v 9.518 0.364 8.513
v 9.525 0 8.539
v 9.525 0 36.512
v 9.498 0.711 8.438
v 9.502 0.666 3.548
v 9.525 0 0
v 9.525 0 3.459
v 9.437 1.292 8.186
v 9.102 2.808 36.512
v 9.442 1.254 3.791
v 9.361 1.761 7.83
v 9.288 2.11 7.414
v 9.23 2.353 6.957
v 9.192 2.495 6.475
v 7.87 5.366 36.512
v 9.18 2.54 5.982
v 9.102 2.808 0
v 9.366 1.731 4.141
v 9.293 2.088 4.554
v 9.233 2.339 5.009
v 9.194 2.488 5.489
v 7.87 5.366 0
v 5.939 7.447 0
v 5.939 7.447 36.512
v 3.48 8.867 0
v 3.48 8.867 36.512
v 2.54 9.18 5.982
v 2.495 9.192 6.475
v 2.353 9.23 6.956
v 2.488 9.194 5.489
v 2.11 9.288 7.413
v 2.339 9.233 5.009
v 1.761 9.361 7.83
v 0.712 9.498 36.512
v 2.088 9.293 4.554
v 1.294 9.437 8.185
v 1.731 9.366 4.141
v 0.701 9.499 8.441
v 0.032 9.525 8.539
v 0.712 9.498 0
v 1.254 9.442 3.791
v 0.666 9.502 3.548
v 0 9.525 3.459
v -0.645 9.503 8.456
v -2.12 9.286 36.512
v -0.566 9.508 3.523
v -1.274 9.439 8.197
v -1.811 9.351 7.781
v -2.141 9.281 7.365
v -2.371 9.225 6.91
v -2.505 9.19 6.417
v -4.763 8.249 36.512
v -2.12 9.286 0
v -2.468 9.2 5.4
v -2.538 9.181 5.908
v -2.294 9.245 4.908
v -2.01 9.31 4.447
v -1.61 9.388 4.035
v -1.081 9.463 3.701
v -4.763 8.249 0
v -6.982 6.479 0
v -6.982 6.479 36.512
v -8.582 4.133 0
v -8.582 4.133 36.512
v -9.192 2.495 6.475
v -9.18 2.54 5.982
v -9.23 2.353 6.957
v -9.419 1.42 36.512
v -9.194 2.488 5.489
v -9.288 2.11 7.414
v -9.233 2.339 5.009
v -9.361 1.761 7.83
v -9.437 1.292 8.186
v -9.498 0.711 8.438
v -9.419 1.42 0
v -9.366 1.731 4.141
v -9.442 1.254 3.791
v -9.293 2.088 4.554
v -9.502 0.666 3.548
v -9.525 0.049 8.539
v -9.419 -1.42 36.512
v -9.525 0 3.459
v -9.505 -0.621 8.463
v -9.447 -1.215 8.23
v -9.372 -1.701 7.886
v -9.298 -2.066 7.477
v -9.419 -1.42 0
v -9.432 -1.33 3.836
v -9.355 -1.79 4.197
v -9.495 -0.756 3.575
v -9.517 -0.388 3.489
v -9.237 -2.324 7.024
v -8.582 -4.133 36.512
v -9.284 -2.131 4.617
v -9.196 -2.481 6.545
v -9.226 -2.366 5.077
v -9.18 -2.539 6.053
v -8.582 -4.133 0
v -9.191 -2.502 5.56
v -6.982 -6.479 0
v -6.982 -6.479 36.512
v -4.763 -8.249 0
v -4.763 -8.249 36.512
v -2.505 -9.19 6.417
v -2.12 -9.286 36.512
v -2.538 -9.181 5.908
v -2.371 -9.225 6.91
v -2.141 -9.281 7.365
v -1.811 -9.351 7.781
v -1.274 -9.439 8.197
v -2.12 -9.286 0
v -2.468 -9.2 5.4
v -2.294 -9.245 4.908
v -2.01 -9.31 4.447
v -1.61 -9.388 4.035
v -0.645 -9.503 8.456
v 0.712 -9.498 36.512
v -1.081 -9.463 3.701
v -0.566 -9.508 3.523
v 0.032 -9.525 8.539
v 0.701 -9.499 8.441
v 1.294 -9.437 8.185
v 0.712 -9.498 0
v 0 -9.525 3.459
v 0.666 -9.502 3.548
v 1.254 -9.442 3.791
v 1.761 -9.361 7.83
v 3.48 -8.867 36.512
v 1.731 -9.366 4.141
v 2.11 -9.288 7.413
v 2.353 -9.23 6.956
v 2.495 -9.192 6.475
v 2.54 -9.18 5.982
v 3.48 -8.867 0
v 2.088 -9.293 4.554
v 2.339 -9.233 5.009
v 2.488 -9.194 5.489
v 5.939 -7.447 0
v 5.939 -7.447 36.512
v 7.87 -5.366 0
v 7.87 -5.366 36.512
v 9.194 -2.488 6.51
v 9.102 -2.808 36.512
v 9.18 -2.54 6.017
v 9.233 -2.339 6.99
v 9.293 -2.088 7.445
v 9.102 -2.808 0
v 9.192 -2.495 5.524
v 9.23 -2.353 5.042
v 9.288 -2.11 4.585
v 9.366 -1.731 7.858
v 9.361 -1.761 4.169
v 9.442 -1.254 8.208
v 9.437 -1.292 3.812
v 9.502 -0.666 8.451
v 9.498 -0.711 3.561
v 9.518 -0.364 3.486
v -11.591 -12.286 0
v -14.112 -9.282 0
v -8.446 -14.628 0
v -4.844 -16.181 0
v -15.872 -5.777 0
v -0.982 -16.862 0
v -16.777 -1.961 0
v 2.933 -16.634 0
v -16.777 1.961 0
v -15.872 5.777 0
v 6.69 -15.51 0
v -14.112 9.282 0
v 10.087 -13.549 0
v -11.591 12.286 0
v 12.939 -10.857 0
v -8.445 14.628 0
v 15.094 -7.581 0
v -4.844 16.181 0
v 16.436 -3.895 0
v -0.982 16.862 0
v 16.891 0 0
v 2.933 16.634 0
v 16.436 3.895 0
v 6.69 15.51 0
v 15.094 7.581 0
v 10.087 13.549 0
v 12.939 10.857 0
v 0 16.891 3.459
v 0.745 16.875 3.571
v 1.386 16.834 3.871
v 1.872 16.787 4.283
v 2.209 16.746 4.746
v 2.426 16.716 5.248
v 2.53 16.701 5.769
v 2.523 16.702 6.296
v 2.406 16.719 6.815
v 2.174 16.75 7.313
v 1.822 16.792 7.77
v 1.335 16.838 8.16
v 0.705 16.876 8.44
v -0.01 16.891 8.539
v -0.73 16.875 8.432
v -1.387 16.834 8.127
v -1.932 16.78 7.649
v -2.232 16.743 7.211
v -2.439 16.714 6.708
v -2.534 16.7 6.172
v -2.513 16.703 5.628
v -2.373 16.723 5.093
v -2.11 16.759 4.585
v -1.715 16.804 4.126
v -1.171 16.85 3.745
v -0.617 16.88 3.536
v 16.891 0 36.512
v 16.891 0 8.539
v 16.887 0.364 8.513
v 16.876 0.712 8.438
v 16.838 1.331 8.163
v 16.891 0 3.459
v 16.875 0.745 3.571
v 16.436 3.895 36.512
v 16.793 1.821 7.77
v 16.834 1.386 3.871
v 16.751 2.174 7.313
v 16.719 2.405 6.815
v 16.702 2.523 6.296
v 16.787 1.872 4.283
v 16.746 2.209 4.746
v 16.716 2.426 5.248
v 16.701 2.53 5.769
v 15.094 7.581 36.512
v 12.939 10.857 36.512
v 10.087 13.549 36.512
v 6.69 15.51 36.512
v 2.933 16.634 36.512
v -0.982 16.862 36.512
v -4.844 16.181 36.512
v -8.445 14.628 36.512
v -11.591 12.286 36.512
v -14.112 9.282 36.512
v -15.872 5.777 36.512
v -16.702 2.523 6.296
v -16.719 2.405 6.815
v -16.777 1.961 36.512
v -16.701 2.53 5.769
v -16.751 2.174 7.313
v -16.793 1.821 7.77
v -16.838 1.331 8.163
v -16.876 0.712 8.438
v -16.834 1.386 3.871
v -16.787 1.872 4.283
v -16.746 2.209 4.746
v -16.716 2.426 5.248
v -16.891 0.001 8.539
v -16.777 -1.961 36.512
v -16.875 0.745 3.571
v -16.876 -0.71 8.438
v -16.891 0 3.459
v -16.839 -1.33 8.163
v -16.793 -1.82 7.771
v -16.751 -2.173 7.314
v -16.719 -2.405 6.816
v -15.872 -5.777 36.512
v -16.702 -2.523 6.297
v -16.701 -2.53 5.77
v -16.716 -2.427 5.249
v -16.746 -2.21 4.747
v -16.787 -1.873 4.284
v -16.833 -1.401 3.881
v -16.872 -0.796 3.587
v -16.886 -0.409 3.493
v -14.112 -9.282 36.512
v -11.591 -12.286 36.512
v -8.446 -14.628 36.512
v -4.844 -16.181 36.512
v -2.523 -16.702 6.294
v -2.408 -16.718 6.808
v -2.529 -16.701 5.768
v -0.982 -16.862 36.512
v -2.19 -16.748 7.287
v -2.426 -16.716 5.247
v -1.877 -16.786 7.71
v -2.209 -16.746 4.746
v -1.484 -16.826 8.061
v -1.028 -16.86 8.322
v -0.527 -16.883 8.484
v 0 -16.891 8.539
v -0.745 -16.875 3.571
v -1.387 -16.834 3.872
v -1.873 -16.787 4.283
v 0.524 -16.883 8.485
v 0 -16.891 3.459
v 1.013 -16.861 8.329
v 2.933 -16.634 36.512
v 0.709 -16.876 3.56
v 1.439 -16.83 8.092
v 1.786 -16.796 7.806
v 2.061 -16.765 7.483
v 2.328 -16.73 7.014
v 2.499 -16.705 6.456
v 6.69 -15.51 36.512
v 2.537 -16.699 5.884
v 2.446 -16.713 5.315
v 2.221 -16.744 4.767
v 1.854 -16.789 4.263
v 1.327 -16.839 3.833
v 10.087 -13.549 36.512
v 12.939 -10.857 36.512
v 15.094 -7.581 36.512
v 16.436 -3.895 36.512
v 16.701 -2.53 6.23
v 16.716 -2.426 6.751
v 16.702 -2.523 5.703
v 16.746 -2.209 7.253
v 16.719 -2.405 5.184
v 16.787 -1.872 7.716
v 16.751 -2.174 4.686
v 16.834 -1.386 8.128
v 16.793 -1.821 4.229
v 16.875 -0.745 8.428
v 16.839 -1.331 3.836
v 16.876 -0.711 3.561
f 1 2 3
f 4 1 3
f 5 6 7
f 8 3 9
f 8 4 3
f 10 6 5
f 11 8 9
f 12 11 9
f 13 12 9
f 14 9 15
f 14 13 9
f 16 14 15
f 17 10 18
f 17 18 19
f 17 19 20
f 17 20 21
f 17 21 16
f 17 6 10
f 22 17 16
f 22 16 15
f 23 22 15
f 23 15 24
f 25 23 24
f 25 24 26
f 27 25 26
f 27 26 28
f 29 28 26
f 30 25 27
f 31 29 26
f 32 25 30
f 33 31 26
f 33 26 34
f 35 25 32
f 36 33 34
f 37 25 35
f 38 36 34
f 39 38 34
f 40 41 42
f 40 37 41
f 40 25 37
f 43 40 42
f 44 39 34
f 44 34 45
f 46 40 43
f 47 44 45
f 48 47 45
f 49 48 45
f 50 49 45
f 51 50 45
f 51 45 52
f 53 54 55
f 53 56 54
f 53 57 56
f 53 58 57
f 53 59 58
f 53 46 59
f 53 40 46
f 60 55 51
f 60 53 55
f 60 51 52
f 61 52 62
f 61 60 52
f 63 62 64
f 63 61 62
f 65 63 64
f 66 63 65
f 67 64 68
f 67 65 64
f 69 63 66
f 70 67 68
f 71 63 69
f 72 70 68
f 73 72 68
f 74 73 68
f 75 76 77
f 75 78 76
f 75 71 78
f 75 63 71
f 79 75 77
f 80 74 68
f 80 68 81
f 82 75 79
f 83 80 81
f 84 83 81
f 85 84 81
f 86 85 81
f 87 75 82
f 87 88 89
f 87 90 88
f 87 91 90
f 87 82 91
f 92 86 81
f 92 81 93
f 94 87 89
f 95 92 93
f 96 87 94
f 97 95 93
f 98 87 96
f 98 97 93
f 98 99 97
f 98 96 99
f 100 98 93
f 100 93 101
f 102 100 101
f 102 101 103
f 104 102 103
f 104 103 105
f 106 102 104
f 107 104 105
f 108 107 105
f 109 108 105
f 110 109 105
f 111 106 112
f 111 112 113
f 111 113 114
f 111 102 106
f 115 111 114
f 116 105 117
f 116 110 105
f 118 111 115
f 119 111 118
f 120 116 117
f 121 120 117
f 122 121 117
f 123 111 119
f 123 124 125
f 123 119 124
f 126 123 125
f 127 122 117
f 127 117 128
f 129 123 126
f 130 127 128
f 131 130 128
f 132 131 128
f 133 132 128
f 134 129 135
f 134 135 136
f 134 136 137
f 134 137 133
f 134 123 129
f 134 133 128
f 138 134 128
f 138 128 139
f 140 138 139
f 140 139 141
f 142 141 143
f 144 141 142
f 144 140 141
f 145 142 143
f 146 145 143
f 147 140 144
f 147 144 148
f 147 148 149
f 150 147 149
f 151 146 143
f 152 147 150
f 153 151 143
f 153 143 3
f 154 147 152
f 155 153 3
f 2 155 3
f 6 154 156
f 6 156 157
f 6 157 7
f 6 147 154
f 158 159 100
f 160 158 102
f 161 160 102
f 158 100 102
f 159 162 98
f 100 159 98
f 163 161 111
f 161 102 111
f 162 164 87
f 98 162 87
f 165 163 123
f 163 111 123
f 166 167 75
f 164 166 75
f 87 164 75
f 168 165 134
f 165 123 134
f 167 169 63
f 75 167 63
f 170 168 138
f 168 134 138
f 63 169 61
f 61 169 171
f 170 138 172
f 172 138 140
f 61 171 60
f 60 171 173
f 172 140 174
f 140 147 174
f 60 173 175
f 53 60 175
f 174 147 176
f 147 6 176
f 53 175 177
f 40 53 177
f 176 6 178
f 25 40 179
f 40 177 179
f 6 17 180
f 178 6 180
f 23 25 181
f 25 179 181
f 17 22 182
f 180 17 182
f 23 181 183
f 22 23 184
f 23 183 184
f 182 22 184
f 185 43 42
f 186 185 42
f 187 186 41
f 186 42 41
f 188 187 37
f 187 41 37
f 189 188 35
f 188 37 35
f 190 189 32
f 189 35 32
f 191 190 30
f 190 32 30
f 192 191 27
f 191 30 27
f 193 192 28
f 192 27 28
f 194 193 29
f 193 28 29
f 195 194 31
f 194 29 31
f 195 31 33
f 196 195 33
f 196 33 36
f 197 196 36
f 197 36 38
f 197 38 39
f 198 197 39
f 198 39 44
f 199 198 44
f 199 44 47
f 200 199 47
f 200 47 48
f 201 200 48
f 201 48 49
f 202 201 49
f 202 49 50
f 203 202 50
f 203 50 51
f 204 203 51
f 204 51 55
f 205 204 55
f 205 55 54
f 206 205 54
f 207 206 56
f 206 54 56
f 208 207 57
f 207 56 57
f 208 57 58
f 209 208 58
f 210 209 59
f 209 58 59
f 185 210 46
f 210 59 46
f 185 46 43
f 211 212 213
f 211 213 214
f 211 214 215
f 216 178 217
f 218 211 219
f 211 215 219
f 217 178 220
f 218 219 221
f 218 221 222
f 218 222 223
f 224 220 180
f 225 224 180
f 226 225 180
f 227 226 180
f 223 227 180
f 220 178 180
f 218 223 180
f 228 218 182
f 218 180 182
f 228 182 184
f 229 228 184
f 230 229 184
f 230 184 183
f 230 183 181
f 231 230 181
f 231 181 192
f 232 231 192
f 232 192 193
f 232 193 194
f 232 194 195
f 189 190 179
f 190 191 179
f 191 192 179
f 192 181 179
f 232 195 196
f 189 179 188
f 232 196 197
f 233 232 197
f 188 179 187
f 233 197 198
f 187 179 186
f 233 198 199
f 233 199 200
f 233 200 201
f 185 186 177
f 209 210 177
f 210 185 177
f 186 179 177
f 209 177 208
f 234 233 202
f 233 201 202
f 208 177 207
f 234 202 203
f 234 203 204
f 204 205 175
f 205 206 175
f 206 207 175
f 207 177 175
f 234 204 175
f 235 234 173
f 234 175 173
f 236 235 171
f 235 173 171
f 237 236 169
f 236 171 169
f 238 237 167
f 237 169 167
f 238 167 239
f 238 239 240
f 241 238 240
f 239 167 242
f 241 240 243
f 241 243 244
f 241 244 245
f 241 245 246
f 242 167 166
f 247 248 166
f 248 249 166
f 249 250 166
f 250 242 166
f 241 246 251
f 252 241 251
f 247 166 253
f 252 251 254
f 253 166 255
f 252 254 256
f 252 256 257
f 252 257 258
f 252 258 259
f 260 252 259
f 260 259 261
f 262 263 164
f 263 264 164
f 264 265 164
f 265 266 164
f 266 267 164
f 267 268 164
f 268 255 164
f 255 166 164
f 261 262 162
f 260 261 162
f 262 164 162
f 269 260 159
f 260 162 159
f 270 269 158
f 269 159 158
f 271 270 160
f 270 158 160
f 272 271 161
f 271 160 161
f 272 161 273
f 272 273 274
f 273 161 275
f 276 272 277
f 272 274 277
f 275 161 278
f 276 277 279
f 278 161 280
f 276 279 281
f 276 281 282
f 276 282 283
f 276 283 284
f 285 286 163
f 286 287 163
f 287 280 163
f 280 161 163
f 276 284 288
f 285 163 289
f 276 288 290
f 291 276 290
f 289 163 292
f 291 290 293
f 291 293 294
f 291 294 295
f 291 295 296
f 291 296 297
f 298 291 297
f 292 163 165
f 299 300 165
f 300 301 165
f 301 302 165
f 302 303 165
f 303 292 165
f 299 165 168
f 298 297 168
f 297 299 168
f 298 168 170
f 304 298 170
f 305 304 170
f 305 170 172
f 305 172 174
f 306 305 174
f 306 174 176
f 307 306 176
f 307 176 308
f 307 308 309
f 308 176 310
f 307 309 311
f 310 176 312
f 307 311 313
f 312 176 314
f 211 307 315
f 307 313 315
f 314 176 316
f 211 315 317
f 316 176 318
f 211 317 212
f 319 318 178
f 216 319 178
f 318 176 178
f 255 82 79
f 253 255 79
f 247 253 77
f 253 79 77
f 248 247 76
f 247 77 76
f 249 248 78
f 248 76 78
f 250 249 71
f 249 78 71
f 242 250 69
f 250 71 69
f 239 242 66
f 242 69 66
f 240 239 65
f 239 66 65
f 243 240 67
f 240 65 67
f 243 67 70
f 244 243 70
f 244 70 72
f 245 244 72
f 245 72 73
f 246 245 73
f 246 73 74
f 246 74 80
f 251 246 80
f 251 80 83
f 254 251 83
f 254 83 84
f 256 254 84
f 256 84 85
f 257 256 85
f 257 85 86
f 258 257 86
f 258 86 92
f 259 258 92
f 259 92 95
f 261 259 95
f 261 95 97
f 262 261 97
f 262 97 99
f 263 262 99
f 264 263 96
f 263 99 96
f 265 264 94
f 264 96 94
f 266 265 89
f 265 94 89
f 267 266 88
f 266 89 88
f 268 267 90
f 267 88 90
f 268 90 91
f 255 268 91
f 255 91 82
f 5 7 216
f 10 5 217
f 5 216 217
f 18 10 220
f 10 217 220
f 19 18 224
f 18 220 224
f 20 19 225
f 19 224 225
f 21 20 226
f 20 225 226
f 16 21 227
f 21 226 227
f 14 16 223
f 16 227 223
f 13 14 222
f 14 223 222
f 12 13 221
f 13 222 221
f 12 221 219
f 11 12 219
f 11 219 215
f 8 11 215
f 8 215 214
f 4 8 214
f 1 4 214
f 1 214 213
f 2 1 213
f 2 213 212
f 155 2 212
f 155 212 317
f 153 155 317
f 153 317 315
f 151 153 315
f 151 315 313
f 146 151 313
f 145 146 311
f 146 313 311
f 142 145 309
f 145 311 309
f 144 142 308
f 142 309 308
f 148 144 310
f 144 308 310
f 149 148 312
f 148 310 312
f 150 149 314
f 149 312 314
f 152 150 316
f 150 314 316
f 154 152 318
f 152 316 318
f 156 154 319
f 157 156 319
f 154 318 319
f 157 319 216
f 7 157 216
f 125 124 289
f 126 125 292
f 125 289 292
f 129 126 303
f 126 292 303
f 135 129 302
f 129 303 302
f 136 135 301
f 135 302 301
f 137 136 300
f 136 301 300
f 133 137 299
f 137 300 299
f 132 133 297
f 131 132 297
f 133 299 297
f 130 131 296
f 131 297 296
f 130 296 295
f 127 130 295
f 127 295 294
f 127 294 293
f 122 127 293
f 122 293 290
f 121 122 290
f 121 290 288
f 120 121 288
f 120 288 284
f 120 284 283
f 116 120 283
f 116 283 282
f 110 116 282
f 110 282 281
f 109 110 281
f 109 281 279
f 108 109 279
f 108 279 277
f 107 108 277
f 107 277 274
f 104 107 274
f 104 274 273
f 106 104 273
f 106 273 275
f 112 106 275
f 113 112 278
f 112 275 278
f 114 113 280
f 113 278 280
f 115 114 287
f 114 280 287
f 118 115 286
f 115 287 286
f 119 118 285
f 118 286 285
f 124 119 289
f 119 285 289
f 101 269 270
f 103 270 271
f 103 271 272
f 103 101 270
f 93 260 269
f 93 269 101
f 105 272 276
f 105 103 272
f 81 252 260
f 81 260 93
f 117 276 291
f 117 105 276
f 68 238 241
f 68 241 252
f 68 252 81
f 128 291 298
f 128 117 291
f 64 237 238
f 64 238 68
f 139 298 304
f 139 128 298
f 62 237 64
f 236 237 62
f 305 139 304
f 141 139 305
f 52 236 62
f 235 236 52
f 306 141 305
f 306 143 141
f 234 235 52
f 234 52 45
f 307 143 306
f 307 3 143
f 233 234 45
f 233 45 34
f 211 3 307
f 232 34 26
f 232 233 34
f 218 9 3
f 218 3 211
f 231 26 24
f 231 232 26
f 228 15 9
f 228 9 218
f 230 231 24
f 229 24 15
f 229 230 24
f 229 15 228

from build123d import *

# Parameters (mm, degrees)
SKETCH1_R           = 16.891
SKETCH1_R_2         = 9.525
BOSS_EXTRUDE1_DEPTH = 36.5125
SKETCH2_R           = 2.54
CUT_EXTRUDE1_DEPTH  = 36.5125
CIRPATTERN1_COUNT   = 4


with BuildPart() as part:
    # Sketch1 → Boss-Extrude1 (new body)
    with BuildSketch(Plane.XY):
        Circle(SKETCH1_R)
        Circle(SKETCH1_R_2, mode=Mode.SUBTRACT)
    extrude(amount=BOSS_EXTRUDE1_DEPTH)

    # Sketch2 → Cut-Extrude1 (cut)
    with BuildSketch(Plane(origin=(16.891, 0, 0), x_dir=(0, 0, -1), z_dir=(1, 0, 0))):
        with Locations((-5.99948, 0)):
            Circle(SKETCH2_R)
    cut_extrude1 = extrude(amount=-CUT_EXTRUDE1_DEPTH, mode=Mode.SUBTRACT)

    # CirPattern1: Cut-Extrude1 ×4 about axis
    cirpattern1_axis = Axis((0, 0, 36.5125), (0, 0, -1))
    for i in range(1, CIRPATTERN1_COUNT):
        add(cut_extrude1.rotate(cirpattern1_axis, i * 360 / CIRPATTERN1_COUNT), mode=Mode.SUBTRACT)


solid = part.part
